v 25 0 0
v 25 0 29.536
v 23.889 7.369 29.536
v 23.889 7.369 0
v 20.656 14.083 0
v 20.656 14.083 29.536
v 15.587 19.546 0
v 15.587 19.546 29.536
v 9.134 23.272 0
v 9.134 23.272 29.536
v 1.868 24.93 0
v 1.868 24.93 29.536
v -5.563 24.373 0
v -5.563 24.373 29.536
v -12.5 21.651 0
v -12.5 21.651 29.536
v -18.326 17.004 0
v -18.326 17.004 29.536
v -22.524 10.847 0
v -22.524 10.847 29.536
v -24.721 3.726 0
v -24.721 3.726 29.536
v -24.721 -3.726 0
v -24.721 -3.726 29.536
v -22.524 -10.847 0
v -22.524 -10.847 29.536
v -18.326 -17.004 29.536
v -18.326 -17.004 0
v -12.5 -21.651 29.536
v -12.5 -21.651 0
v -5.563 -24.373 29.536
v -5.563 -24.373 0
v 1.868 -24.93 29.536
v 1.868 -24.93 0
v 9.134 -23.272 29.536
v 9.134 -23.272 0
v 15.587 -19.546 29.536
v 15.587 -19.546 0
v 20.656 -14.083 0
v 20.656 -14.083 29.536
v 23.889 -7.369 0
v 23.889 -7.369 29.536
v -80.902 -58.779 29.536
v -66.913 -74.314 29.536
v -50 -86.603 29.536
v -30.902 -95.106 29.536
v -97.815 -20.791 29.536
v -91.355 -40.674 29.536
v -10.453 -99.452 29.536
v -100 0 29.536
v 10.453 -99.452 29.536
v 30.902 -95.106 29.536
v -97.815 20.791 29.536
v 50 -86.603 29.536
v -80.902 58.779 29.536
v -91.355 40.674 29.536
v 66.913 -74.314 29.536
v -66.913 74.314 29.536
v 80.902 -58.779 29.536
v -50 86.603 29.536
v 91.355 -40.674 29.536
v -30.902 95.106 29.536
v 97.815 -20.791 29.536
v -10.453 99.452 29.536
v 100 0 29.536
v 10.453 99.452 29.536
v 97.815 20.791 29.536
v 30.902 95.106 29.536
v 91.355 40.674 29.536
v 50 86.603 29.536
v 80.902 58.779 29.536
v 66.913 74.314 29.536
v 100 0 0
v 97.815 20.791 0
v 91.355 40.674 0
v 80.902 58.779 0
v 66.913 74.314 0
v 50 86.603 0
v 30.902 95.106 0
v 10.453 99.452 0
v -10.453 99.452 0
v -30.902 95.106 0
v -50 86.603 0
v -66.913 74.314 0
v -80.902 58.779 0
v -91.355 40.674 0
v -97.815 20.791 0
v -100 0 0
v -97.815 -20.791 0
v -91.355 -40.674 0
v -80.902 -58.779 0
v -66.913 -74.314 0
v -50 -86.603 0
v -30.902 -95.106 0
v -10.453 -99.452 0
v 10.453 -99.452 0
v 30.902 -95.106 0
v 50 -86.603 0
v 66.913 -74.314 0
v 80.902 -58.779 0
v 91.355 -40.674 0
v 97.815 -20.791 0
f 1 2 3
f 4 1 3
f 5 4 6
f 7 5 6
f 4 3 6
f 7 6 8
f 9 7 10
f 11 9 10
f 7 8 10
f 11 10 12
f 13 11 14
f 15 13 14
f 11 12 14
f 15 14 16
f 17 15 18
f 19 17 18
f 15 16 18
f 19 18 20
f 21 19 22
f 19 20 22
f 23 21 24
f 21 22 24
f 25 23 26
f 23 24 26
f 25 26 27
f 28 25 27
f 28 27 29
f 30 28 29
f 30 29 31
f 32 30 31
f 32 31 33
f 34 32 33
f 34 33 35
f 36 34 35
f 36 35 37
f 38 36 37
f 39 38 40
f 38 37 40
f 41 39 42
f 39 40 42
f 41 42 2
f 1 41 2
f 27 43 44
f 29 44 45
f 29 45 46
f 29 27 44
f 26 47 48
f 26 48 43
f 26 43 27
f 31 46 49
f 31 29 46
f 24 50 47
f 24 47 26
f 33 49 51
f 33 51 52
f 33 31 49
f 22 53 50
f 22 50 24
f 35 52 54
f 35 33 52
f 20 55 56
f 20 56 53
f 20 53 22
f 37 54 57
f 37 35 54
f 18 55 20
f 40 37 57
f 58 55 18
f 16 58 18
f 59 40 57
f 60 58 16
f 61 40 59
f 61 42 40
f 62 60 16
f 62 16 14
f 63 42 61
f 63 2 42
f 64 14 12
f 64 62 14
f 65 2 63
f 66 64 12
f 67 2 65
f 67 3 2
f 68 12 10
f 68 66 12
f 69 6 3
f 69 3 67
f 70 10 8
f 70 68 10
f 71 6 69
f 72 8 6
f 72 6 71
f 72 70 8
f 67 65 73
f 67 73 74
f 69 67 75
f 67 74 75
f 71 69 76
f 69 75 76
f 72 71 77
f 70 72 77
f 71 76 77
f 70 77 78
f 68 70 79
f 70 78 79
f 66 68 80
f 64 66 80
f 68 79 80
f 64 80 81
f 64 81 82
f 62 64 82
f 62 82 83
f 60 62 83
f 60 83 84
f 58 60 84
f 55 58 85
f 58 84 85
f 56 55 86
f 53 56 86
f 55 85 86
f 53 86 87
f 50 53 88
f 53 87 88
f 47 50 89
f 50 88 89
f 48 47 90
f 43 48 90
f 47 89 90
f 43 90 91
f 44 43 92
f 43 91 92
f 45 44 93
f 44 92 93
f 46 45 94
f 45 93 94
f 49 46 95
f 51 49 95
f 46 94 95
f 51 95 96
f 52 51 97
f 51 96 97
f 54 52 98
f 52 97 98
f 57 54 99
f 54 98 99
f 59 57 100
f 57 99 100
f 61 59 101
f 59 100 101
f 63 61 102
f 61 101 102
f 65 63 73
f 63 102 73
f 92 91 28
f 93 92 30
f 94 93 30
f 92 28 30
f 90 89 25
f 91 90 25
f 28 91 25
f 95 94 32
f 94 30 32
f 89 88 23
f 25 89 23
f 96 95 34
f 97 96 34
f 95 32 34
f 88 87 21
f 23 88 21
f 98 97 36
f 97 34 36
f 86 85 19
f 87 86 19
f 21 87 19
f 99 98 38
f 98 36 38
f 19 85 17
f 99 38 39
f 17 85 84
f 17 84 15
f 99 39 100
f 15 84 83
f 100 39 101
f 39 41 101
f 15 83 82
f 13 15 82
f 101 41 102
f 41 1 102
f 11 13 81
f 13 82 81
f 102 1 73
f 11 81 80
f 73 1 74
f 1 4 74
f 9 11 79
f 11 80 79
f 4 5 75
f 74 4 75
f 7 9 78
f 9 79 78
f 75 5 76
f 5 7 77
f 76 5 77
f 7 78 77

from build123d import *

# Parameters (mm, degrees)
SKETCH_1_R          = 150
EXTRUDE_1_DEPTH     = 29.535936744
SKETCH_2_R          = 25
CUT_EXTRUDE_2_DEPTH = 29.535936744
CUT_EXTRUDE_START   = -29.535936744
SKETCH_3_R          = 150
SKETCH_3_R_2        = 100
CUT_EXTRUDE_3_DEPTH = 29.535936744


with BuildPart() as part:
    # 草图1 → 凸台-拉伸1 (new body)
    with BuildSketch(Plane.XY):
        Circle(SKETCH_1_R)
    extrude(amount=EXTRUDE_1_DEPTH)

    # 草图2 → 切除-拉伸2 (cut)
    with BuildSketch(Plane.XY.offset(29.535936744)):
        Circle(SKETCH_2_R)
    extrude(amount=-CUT_EXTRUDE_2_DEPTH, mode=Mode.SUBTRACT)

    # 草图3 → 切除-拉伸3 (cut)
    with BuildSketch(Plane.XY.offset(29.535936744).offset(CUT_EXTRUDE_START)):
        Circle(SKETCH_3_R)
        Circle(SKETCH_3_R_2, mode=Mode.SUBTRACT)
    extrude(amount=CUT_EXTRUDE_3_DEPTH, mode=Mode.SUBTRACT)


solid = part.part
